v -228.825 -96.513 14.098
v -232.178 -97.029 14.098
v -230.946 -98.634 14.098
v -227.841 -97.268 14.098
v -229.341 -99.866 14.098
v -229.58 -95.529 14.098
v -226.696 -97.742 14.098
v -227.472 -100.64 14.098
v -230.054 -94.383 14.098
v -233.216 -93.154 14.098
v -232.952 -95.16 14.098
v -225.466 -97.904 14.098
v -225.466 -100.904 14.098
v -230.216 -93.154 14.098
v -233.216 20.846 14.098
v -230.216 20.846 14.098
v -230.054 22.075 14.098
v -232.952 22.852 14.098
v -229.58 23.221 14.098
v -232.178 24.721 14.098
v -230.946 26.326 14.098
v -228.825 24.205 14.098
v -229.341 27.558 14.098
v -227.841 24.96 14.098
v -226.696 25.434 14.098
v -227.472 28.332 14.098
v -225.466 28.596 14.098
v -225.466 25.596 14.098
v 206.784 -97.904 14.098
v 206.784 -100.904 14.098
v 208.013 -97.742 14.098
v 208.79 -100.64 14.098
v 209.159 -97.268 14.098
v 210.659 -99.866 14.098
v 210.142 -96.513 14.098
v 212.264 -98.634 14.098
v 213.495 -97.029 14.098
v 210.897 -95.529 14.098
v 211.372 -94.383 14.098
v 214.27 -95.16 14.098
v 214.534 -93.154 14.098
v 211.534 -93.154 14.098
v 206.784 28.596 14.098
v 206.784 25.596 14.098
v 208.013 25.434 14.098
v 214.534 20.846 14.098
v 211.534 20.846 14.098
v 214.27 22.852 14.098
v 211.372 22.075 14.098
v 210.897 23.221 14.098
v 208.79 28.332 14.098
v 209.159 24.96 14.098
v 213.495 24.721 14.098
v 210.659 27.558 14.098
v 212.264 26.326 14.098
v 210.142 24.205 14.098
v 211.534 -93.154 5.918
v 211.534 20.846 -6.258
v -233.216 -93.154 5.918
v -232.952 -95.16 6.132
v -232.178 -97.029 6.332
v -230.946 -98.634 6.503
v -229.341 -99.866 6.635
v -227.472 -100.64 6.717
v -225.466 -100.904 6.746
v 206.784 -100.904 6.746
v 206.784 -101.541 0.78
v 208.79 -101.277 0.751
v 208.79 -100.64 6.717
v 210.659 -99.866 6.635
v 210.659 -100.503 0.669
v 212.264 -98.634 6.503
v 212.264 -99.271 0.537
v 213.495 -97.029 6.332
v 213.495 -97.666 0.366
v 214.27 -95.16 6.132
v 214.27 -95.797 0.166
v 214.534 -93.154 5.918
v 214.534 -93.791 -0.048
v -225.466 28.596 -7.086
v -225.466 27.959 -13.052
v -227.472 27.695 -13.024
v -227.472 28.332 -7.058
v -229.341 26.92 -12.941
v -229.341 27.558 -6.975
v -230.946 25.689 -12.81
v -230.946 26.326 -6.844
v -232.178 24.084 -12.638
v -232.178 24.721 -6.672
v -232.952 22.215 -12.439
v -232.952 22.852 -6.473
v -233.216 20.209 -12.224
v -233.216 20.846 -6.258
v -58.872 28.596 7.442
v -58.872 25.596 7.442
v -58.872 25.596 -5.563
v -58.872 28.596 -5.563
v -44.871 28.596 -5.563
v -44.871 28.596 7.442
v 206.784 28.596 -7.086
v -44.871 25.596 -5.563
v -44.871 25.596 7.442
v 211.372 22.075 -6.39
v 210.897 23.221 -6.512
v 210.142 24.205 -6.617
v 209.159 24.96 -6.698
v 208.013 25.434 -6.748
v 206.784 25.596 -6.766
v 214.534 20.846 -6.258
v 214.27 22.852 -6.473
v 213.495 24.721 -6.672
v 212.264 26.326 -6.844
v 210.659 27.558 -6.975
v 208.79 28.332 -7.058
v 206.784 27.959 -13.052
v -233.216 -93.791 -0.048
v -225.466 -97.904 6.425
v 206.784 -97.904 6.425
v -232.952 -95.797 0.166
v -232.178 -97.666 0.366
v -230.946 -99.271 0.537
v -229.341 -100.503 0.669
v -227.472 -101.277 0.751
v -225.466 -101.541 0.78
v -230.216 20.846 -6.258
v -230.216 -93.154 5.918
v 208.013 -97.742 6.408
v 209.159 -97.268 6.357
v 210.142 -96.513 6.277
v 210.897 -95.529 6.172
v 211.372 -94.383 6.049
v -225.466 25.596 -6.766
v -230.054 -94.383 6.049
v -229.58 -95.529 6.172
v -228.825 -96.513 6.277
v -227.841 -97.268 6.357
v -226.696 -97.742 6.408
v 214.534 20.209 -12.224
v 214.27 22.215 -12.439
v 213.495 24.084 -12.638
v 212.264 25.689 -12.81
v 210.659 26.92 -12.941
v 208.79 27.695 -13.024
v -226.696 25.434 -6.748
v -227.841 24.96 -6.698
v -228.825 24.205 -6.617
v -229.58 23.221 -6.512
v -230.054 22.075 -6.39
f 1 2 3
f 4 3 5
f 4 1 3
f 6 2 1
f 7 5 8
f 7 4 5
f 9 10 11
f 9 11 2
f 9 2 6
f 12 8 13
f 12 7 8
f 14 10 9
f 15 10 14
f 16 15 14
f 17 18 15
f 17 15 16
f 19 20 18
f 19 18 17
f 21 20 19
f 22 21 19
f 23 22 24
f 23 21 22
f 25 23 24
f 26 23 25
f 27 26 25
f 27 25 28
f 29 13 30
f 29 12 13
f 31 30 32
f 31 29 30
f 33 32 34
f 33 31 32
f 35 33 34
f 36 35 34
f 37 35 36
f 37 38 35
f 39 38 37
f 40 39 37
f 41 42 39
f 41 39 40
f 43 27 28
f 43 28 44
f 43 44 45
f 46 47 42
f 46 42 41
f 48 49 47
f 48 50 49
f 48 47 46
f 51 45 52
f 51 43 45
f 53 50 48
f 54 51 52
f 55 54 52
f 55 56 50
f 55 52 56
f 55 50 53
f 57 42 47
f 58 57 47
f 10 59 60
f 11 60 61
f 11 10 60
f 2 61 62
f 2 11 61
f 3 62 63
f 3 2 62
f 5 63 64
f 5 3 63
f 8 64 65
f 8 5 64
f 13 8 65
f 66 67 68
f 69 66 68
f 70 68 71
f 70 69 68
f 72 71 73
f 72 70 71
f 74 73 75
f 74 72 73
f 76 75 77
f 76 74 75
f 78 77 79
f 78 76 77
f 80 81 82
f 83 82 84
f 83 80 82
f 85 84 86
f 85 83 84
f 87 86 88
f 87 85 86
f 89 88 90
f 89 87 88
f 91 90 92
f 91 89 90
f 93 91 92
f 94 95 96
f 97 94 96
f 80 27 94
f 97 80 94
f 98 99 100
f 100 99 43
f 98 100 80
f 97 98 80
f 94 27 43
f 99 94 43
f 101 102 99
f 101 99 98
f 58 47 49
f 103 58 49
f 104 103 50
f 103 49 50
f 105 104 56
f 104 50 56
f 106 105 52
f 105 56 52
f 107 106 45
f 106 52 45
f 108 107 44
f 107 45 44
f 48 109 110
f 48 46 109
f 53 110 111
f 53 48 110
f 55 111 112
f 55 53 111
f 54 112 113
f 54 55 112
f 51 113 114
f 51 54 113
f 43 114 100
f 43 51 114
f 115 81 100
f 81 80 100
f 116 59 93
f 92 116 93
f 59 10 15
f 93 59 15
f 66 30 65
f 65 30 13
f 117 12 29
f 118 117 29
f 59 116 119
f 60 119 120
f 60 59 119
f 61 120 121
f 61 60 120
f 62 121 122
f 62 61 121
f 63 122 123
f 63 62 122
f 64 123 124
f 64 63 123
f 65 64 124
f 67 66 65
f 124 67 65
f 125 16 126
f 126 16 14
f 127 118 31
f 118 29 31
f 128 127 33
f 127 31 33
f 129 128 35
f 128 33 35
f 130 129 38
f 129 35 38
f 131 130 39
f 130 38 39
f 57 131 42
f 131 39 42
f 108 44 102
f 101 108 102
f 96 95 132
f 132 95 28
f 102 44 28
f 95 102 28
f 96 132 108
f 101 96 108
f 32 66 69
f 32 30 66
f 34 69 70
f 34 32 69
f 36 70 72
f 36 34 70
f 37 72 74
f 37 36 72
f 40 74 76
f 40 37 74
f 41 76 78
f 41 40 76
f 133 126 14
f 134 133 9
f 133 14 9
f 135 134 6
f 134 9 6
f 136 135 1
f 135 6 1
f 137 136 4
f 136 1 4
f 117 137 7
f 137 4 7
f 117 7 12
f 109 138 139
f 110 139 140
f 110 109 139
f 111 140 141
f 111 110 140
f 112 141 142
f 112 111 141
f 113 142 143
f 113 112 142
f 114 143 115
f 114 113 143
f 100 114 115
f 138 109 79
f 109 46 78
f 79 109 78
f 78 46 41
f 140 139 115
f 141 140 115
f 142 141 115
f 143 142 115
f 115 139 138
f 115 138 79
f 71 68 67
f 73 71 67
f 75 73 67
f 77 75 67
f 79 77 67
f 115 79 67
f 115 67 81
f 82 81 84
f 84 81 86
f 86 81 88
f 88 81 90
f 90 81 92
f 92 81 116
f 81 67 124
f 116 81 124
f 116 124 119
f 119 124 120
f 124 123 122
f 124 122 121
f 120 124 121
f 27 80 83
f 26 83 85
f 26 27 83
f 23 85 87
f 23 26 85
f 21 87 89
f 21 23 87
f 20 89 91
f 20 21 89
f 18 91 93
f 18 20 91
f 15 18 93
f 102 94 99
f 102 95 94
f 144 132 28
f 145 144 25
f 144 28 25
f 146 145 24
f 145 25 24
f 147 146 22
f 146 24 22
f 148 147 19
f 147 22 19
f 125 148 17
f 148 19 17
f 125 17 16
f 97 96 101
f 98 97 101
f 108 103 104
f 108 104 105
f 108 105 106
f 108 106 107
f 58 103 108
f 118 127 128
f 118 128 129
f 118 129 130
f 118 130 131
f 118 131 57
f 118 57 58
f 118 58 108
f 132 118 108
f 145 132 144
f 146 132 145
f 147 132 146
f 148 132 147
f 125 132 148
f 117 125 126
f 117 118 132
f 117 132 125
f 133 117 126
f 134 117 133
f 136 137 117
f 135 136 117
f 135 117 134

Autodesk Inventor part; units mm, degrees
ref_plane "YZ Plane" through (0, 0, 0) normal (1, 0, 0) x (0, 1, 0)
ref_plane "XZ Plane" through (0, 0, 0) normal (0, 1, 0) x (-1, 0, 0)
ref_plane "XY Plane" through (0, 0, 0) normal (0, 0, 1) x (1, 0, 0)
sketch "Sketch1" plane through (0, 0, 0) normal (1, 0, 0) x (0, 1, 0)
  line L0 (-93.1541, 14.0981) -> (20.8459, 14.0981) projected
  line L1 (-93.1541, 14.0981) -> (-93.1541, 12.5981) projected
  line L2 (20.8459, 12.5981) -> (-93.1541, 12.5981) projected
  line L3 (20.8459, 14.0981) -> (20.8459, 12.5981) projected
  line L4 (-93.1541, 7.4943) -> (-93.1541, 9.0943) projected
  line L5 (-93.1541, 7.4943) -> (20.8459, 7.4943) projected
  line L6 (20.8459, 7.4943) -> (20.8459, 9.0943) projected
  line L7 (-93.1541, 9.0943) -> (20.8459, 9.0943) projected
  line L8 (25.5959, 14.0981) -> (20.8459, 14.0981) projected
  line L9 (20.8459, 12.5981) -> (25.5959, 12.5981) projected
  line L10 (25.5959, 14.0981) -> (25.5959, 12.5981) projected
  line L11 (25.5959, 9.0943) -> (20.8459, 9.0943) projected
  line L12 (25.5959, 7.4943) -> (20.8459, 7.4943) projected
  line L13 (25.5959, 7.4943) -> (25.5959, 9.0943) projected
  line L14 (-93.1541, 9.0943) -> (-97.9041, 9.0943) projected
  line L15 (-93.1541, 7.4943) -> (-97.9041, 7.4943) projected
  line L16 (-97.9041, 7.4943) -> (-97.9041, 9.0943) projected
  line L17 (-93.1541, 14.0981) -> (-97.9041, 14.0981) projected
  line L18 (-97.9041, 12.5981) -> (-93.1541, 12.5981) projected
  line L19 (-97.9041, 14.0981) -> (-97.9041, 12.5981) projected
  line L20 (-93.4041, 11.6343) -> (-93.3041, 11.6343) projected
  point P0 (0, 0)
ref_plane "Work Plane1" through (-45.4451, 14.3376, -5.5632) normal (0, 0.1062, 0.9943) x (-1, 0, 0)
ref_plane "Work Plane2" through (-9.3413, -36.1541, 14.0981) normal (0, 0, 1) x (1, 0, 0)
sketch "Sketch3" plane through (-9.3413, -36.1541, 14.0981) normal (0, 0, 1) x (1, 0, 0)
  line L0 (-211.6644, 41.535) -> (-205.2313, 59.21) projected
  line L1 (-205.2313, 59.21) -> (-202.7313, 59.21) projected
  line L2 (-202.7313, 59.21) -> (-209.1644, 41.535) projected
  line L3 (-209.1644, 41.535) -> (-211.6644, 41.535) projected
  line L4 (-201.6644, 41.535) -> (-195.2313, 59.21) projected
  line L5 (-195.2313, 59.21) -> (-192.7313, 59.21) projected
  line L6 (-192.7313, 59.21) -> (-199.1644, 41.535) projected
  line L7 (-199.1644, 41.535) -> (-201.6644, 41.535) projected
  line L8 (-191.6644, 41.535) -> (-185.2313, 59.21) projected
  line L9 (-185.2313, 59.21) -> (-182.7313, 59.21) projected
  line L10 (-182.7313, 59.21) -> (-189.1644, 41.535) projected
  line L11 (-189.1644, 41.535) -> (-191.6644, 41.535) projected
  line L12 (-181.6644, 41.535) -> (-175.2313, 59.21) projected
  line L13 (-175.2313, 59.21) -> (-172.7313, 59.21) projected
  line L14 (-172.7313, 59.21) -> (-179.1644, 41.535) projected
  line L15 (-179.1644, 41.535) -> (-181.6644, 41.535) projected
  line L16 (-171.6644, 41.535) -> (-165.2313, 59.21) projected
  line L17 (-165.2313, 59.21) -> (-162.7313, 59.21) projected
  line L18 (-162.7313, 59.21) -> (-169.1644, 41.535) projected
  line L19 (-169.1644, 41.535) -> (-171.6644, 41.535) projected
  line L20 (-161.6644, 41.535) -> (-155.2313, 59.21) projected
  line L21 (-155.2313, 59.21) -> (-152.7313, 59.21) projected
  line L22 (-152.7313, 59.21) -> (-159.1644, 41.535) projected
  line L23 (-159.1644, 41.535) -> (-161.6644, 41.535) projected
  line L24 (-151.6644, 41.535) -> (-145.2313, 59.21) projected
  line L25 (-145.2313, 59.21) -> (-142.7313, 59.21) projected
  line L26 (-142.7313, 59.21) -> (-149.1644, 41.535) projected
  line L27 (-149.1644, 41.535) -> (-151.6644, 41.535) projected
  line L28 (-141.6644, 41.535) -> (-135.2313, 59.21) projected
  line L29 (-135.2313, 59.21) -> (-132.7313, 59.21) projected
  line L30 (-132.7313, 59.21) -> (-139.1644, 41.535) projected
  line L31 (-139.1644, 41.535) -> (-141.6644, 41.535) projected
  line L32 (-134.1647, 41.535) -> (-136.6647, 41.535) projected
  line L33 (-136.6647, 41.535) -> (-131.39, 56.027) projected
  line L34 (-131.39, 56.027) -> (-131.39, 49.1583) projected
  line L35 (-131.39, 49.1583) -> (-134.1647, 41.535) projected
  line L36 (-141.27, 35.75) -> (-143.77, 35.75) projected
  line L37 (-143.77, 35.75) -> (-142.3378, 39.685) projected
  line L38 (-142.3378, 39.685) -> (-139.8378, 39.685) projected
  line L39 (-139.8378, 39.685) -> (-141.27, 35.75) projected
  line L40 (-151.27, 35.75) -> (-153.77, 35.75) projected
  line L41 (-153.77, 35.75) -> (-152.3378, 39.685) projected
  line L42 (-152.3378, 39.685) -> (-149.8378, 39.685) projected
  line L43 (-149.8378, 39.685) -> (-151.27, 35.75) projected
  line L44 (-161.27, 35.75) -> (-163.77, 35.75) projected
  line L45 (-163.77, 35.75) -> (-162.3378, 39.685) projected
  line L46 (-162.3378, 39.685) -> (-159.8378, 39.685) projected
  line L47 (-159.8378, 39.685) -> (-161.27, 35.75) projected
  line L48 (-171.27, 35.75) -> (-173.77, 35.75) projected
  line L49 (-173.77, 35.75) -> (-172.3378, 39.685) projected
  line L50 (-172.3378, 39.685) -> (-169.8378, 39.685) projected
  line L51 (-169.8378, 39.685) -> (-171.27, 35.75) projected
  line L52 (-181.27, 35.75) -> (-183.77, 35.75) projected
  line L53 (-183.77, 35.75) -> (-182.3378, 39.685) projected
  line L54 (-182.3378, 39.685) -> (-179.8378, 39.685) projected
  line L55 (-179.8378, 39.685) -> (-181.27, 35.75) projected
  line L56 (-191.27, 35.75) -> (-193.77, 35.75) projected
  line L57 (-193.77, 35.75) -> (-192.3378, 39.685) projected
  line L58 (-192.3378, 39.685) -> (-189.8378, 39.685) projected
  line L59 (-189.8378, 39.685) -> (-191.27, 35.75) projected
  line L60 (-201.27, 35.75) -> (-203.77, 35.75) projected
  line L61 (-203.77, 35.75) -> (-202.3378, 39.685) projected
  line L62 (-202.3378, 39.685) -> (-199.8378, 39.685) projected
  line L63 (-199.8378, 39.685) -> (-201.27, 35.75) projected
  line L64 (-211.27, 35.75) -> (-213.77, 35.75) projected
  line L65 (-213.77, 35.75) -> (-212.3378, 39.685) projected
  line L66 (-212.3378, 39.685) -> (-209.8378, 39.685) projected
  line L67 (-209.8378, 39.685) -> (-211.27, 35.75) projected
  line L68 (-206.27, 35.75) -> (-208.77, 35.75) projected
  line L69 (-208.77, 35.75) -> (-207.3378, 39.685) projected
  line L70 (-207.3378, 39.685) -> (-204.8378, 39.685) projected
  line L71 (-204.8378, 39.685) -> (-206.27, 35.75) projected
  line L72 (-196.27, 35.75) -> (-198.77, 35.75) projected
  line L73 (-198.77, 35.75) -> (-197.3378, 39.685) projected
  line L74 (-197.3378, 39.685) -> (-194.8378, 39.685) projected
  line L75 (-194.8378, 39.685) -> (-196.27, 35.75) projected
  line L76 (-186.27, 35.75) -> (-188.77, 35.75) projected
  line L77 (-188.77, 35.75) -> (-187.3378, 39.685) projected
  line L78 (-187.3378, 39.685) -> (-184.8378, 39.685) projected
  line L79 (-184.8378, 39.685) -> (-186.27, 35.75) projected
  line L80 (-176.27, 35.75) -> (-178.77, 35.75) projected
  line L81 (-178.77, 35.75) -> (-177.3378, 39.685) projected
  line L82 (-177.3378, 39.685) -> (-174.8378, 39.685) projected
  line L83 (-174.8378, 39.685) -> (-176.27, 35.75) projected
  line L84 (-166.27, 35.75) -> (-168.77, 35.75) projected
  line L85 (-168.77, 35.75) -> (-167.3378, 39.685) projected
  line L86 (-167.3378, 39.685) -> (-164.8378, 39.685) projected
  line L87 (-164.8378, 39.685) -> (-166.27, 35.75) projected
  line L88 (-156.27, 35.75) -> (-158.77, 35.75) projected
  line L89 (-158.77, 35.75) -> (-157.3378, 39.685) projected
  line L90 (-157.3378, 39.685) -> (-154.8378, 39.685) projected
  line L91 (-154.8378, 39.685) -> (-156.27, 35.75) projected
  line L92 (-146.27, 35.75) -> (-148.77, 35.75) projected
  line L93 (-148.77, 35.75) -> (-147.3378, 39.685) projected
  line L94 (-147.3378, 39.685) -> (-144.8378, 39.685) projected
  line L95 (-144.8378, 39.685) -> (-146.27, 35.75) projected
  line L96 (-136.2702, 35.75) -> (-138.7702, 35.75) projected
  line L97 (-138.7702, 35.75) -> (-137.338, 39.685) projected
  line L98 (-137.338, 39.685) -> (-134.838, 39.685) projected
  line L99 (-134.838, 39.685) -> (-136.2702, 35.75) projected
  line L100 (-213.77, 49.4867) -> (-210.231, 59.21) projected
  line L101 (-210.231, 59.21) -> (-207.731, 59.21) projected
  line L102 (-207.731, 59.21) -> (-213.77, 42.618) projected
  line L103 (-213.77, 42.618) -> (-213.77, 49.4867) projected
  line L104 (-146.6644, 41.535) -> (-140.2313, 59.21) projected
  line L105 (-140.2313, 59.21) -> (-137.7313, 59.21) projected
  line L106 (-137.7313, 59.21) -> (-144.1644, 41.535) projected
  line L107 (-144.1644, 41.535) -> (-146.6644, 41.535) projected
  line L108 (-156.6644, 41.535) -> (-150.2313, 59.21) projected
  line L109 (-150.2313, 59.21) -> (-147.7313, 59.21) projected
  line L110 (-147.7313, 59.21) -> (-154.1644, 41.535) projected
  line L111 (-154.1644, 41.535) -> (-156.6644, 41.535) projected
  line L112 (-166.6644, 41.535) -> (-160.2313, 59.21) projected
  line L113 (-160.2313, 59.21) -> (-157.7313, 59.21) projected
  line L114 (-157.7313, 59.21) -> (-164.1644, 41.535) projected
  line L115 (-164.1644, 41.535) -> (-166.6644, 41.535) projected
  line L116 (-176.6644, 41.535) -> (-170.2313, 59.21) projected
  line L117 (-170.2313, 59.21) -> (-167.7313, 59.21) projected
  line L118 (-167.7313, 59.21) -> (-174.1644, 41.535) projected
  line L119 (-174.1644, 41.535) -> (-176.6644, 41.535) projected
  line L120 (-186.6644, 41.535) -> (-180.2313, 59.21) projected
  line L121 (-180.2313, 59.21) -> (-177.7313, 59.21) projected
  line L122 (-177.7313, 59.21) -> (-184.1644, 41.535) projected
  line L123 (-184.1644, 41.535) -> (-186.6644, 41.535) projected
  line L124 (-196.6644, 41.535) -> (-190.2313, 59.21) projected
  line L125 (-190.2313, 59.21) -> (-187.7313, 59.21) projected
  line L126 (-187.7313, 59.21) -> (-194.1644, 41.535) projected
  line L127 (-194.1644, 41.535) -> (-196.6644, 41.535) projected
  line L128 (-206.6644, 41.535) -> (-200.2313, 59.21) projected
  line L129 (-200.2313, 59.21) -> (-197.7313, 59.21) projected
  line L130 (-197.7313, 59.21) -> (-204.1644, 41.535) projected
  line L131 (-204.1644, 41.535) -> (-206.6644, 41.535) projected
  line L132 (-78.7722, 35.75) -> (-133.77, 35.75) projected
  line L133 (-133.77, 35.75) -> (-132.3378, 39.685) projected
  line L134 (-132.3378, 39.685) -> (-77.34, 39.685) projected
  line L135 (-77.34, 39.685) -> (-78.7722, 35.75) projected
  line L136 (-77.34, 41.535) -> (-129.54, 41.535) projected
  line L137 (-129.54, 41.535) -> (-129.54, 59.315) projected
  line L138 (-129.54, 59.315) -> (-77.34, 59.315) projected
  line L139 (-77.34, 59.315) -> (-77.34, 41.535) projected
  line L140 (159, -26.25) -> (159, -40.25) projected
  line L141 (159, -40.25) -> (145, -40.25) projected
  line L142 (145, -40.25) -> (145, -26.25) projected
  line L143 (145, -26.25) -> (159, -26.25) projected
  line L144 (140, -26.25) -> (140, -40.25) projected
  line L145 (140, -40.25) -> (126, -40.25) projected
  line L146 (126, -40.25) -> (126, -26.25) projected
  line L147 (126, -26.25) -> (140, -26.25) projected
  line L148 (121, -26.25) -> (121, -40.25) projected
  line L149 (121, -40.25) -> (107, -40.25) projected
  line L150 (107, -40.25) -> (107, -26.25) projected
  line L151 (107, -26.25) -> (121, -26.25) projected
  line L152 (102, -26.25) -> (102, -40.25) projected
  line L153 (102, -40.25) -> (88, -40.25) projected
  line L154 (88, -40.25) -> (88, -26.25) projected
  line L155 (88, -26.25) -> (102, -26.25) projected
  line L156 (83, -26.25) -> (83, -40.25) projected
  line L157 (83, -40.25) -> (69, -40.25) projected
  line L158 (69, -40.25) -> (69, -26.25) projected
  line L159 (69, -26.25) -> (83, -26.25) projected
  line L160 (64, -26.25) -> (64, -40.25) projected
  line L161 (64, -40.25) -> (50, -40.25) projected
  line L162 (50, -40.25) -> (50, -26.25) projected
  line L163 (50, -26.25) -> (64, -26.25) projected
  line L164 (45, -26.25) -> (45, -40.25) projected
  line L165 (45, -40.25) -> (31, -40.25) projected
  line L166 (31, -40.25) -> (31, -26.25) projected
  line L167 (31, -26.25) -> (45, -26.25) projected
  line L168 (26, -26.25) -> (26, -40.25) projected
  line L169 (26, -40.25) -> (12, -40.25) projected
  line L170 (12, -40.25) -> (12, -26.25) projected
  line L171 (12, -26.25) -> (26, -26.25) projected
  line L172 (7, -26.25) -> (7, -40.25) projected
  line L173 (7, -40.25) -> (-7, -40.25) projected
  line L174 (-7, -40.25) -> (-7, -26.25) projected
  line L175 (-7, -26.25) -> (7, -26.25) projected
  line L176 (154.5, -7.25) -> (168.5, -7.25) projected
  line L177 (168.5, -7.25) -> (168.5, -21.25) projected
  line L178 (168.5, -21.25) -> (154.5, -21.25) projected
  line L179 (154.5, -21.25) -> (154.5, -7.25) projected
  line L180 (135.5, -7.25) -> (149.5, -7.25) projected
  line L181 (149.5, -7.25) -> (149.5, -21.25) projected
  line L182 (149.5, -21.25) -> (135.5, -21.25) projected
  line L183 (135.5, -21.25) -> (135.5, -7.25) projected
  line L184 (116.5, -7.25) -> (130.5, -7.25) projected
  line L185 (130.5, -7.25) -> (130.5, -21.25) projected
  line L186 (130.5, -21.25) -> (116.5, -21.25) projected
  line L187 (116.5, -21.25) -> (116.5, -7.25) projected
  line L188 (97.5, -7.25) -> (111.5, -7.25) projected
  line L189 (111.5, -7.25) -> (111.5, -21.25) projected
  line L190 (111.5, -21.25) -> (97.5, -21.25) projected
  line L191 (97.5, -21.25) -> (97.5, -7.25) projected
  line L192 (78.5, -7.25) -> (92.5, -7.25) projected
  line L193 (92.5, -7.25) -> (92.5, -21.25) projected
  line L194 (92.5, -21.25) -> (78.5, -21.25) projected
  line L195 (78.5, -21.25) -> (78.5, -7.25) projected
  line L196 (59.5, -7.25) -> (73.5, -7.25) projected
  line L197 (73.5, -7.25) -> (73.5, -21.25) projected
  line L198 (73.5, -21.25) -> (59.5, -21.25) projected
  line L199 (59.5, -21.25) -> (59.5, -7.25) projected
  line L200 (40.5, -7.25) -> (54.5, -7.25) projected
  line L201 (54.5, -7.25) -> (54.5, -21.25) projected
  line L202 (54.5, -21.25) -> (40.5, -21.25) projected
  line L203 (40.5, -21.25) -> (40.5, -7.25) projected
  line L204 (21.5, -7.25) -> (35.5, -7.25) projected
  line L205 (35.5, -7.25) -> (35.5, -21.25) projected
  line L206 (35.5, -21.25) -> (21.5, -21.25) projected
  line L207 (21.5, -21.25) -> (21.5, -7.25) projected
  line L208 (2.5, -7.25) -> (16.5, -7.25) projected
  line L209 (16.5, -7.25) -> (16.5, -21.25) projected
  line L210 (16.5, -21.25) -> (2.5, -21.25) projected
  line L211 (2.5, -21.25) -> (2.5, -7.25) projected
  line L212 (-16.5, -7.25) -> (-2.5, -7.25) projected
  line L213 (-2.5, -7.25) -> (-2.5, -21.25) projected
  line L214 (-2.5, -21.25) -> (-16.5, -21.25) projected
  line L215 (-16.5, -21.25) -> (-16.5, -7.25) projected
  line L216 (182.75, 11.75) -> (182.75, -2.25) projected
  line L217 (182.75, -2.25) -> (168.75, -2.25) projected
  line L218 (168.75, -2.25) -> (168.75, 11.75) projected
  line L219 (168.75, 11.75) -> (182.75, 11.75) projected
  line L220 (163.75, 11.75) -> (163.75, -2.25) projected
  line L221 (163.75, -2.25) -> (149.75, -2.25) projected
  line L222 (149.75, -2.25) -> (149.75, 11.75) projected
  line L223 (149.75, 11.75) -> (163.75, 11.75) projected
  line L224 (144.75, 11.75) -> (144.75, -2.25) projected
  line L225 (144.75, -2.25) -> (130.75, -2.25) projected
  line L226 (130.75, -2.25) -> (130.75, 11.75) projected
  line L227 (130.75, 11.75) -> (144.75, 11.75) projected
  line L228 (125.75, 11.75) -> (125.75, -2.25) projected
  line L229 (125.75, -2.25) -> (111.75, -2.25) projected
  line L230 (111.75, -2.25) -> (111.75, 11.75) projected
  line L231 (111.75, 11.75) -> (125.75, 11.75) projected
  line L232 (106.75, 11.75) -> (106.75, -2.25) projected
  line L233 (106.75, -2.25) -> (92.75, -2.25) projected
  line L234 (92.75, -2.25) -> (92.75, 11.75) projected
  line L235 (92.75, 11.75) -> (106.75, 11.75) projected
  line L236 (87.75, 11.75) -> (87.75, -2.25) projected
  line L237 (87.75, -2.25) -> (73.75, -2.25) projected
  line L238 (73.75, -2.25) -> (73.75, 11.75) projected
  line L239 (73.75, 11.75) -> (87.75, 11.75) projected
  line L240 (68.75, 11.75) -> (68.75, -2.25) projected
  line L241 (68.75, -2.25) -> (54.75, -2.25) projected
  line L242 (54.75, -2.25) -> (54.75, 11.75) projected
  line L243 (54.75, 11.75) -> (68.75, 11.75) projected
  line L244 (49.75, 11.75) -> (49.75, -2.25) projected
  line L245 (49.75, -2.25) -> (35.75, -2.25) projected
  line L246 (35.75, -2.25) -> (35.75, 11.75) projected
  line L247 (35.75, 11.75) -> (49.75, 11.75) projected
  line L248 (30.75, 11.75) -> (30.75, -2.25) projected
  line L249 (30.75, -2.25) -> (16.75, -2.25) projected
  line L250 (16.75, -2.25) -> (16.75, 11.75) projected
  line L251 (16.75, 11.75) -> (30.75, 11.75) projected
  line L252 (11.75, 11.75) -> (11.75, -2.25) projected
  line L253 (11.75, -2.25) -> (-2.25, -2.25) projected
  line L254 (-2.25, -2.25) -> (-2.25, 11.75) projected
  line L255 (-2.25, 11.75) -> (11.75, 11.75) projected
  line L256 (-7.25, 11.75) -> (-7.25, -2.25) projected
  line L257 (-7.25, -2.25) -> (-21.25, -2.25) projected
  line L258 (-21.25, -2.25) -> (-21.25, 11.75) projected
  line L259 (-21.25, 11.75) -> (-7.25, 11.75) projected
  line L260 (-12, -26.25) -> (-12, -40.25) projected
  line L261 (-12, -40.25) -> (-26, -40.25) projected
  line L262 (-26, -40.25) -> (-26, -26.25) projected
  line L263 (-26, -26.25) -> (-12, -26.25) projected
  line L264 (-21.5, -7.25) -> (-21.5, -21.25) projected
  line L265 (-21.5, -21.25) -> (-35.5, -21.25) projected
  line L266 (-35.5, -21.25) -> (-35.5, -7.25) projected
  line L267 (-35.5, -7.25) -> (-21.5, -7.25) projected
  line L268 (-26.25, 11.75) -> (-26.25, -2.25) projected
  line L269 (-26.25, -2.25) -> (-40.25, -2.25) projected
  line L270 (-40.25, -2.25) -> (-40.25, 11.75) projected
  line L271 (-40.25, 11.75) -> (-26.25, 11.75) projected
  line L272 (201.75, 30.75) -> (201.75, 16.75) projected
  line L273 (201.75, 16.75) -> (187.75, 16.75) projected
  line L274 (187.75, 16.75) -> (187.75, 30.75) projected
  line L275 (187.75, 30.75) -> (201.75, 30.75) projected
  line L276 (206.5, 11.75) -> (206.5, -2.25) projected
  line L277 (206.5, -2.25) -> (192.5, -2.25) projected
  line L278 (192.5, -2.25) -> (192.5, 11.75) projected
  line L279 (192.5, 11.75) -> (206.5, 11.75) projected
  line L280 (199.375, -7.25) -> (199.375, -21.25) projected
  line L281 (199.375, -21.25) -> (185.375, -21.25) projected
  line L282 (185.375, -21.25) -> (185.375, -7.25) projected
  line L283 (185.375, -7.25) -> (199.375, -7.25) projected
  line L284 (194.625, -26.25) -> (194.625, -40.25) projected
  line L285 (194.625, -40.25) -> (180.625, -40.25) projected
  line L286 (180.625, -40.25) -> (180.625, -26.25) projected
  line L287 (180.625, -26.25) -> (194.625, -26.25) projected
  line L288 (208.875, -45.25) -> (208.875, -59.25) projected
  line L289 (208.875, -59.25) -> (194.875, -59.25) projected
  line L290 (194.875, -59.25) -> (194.875, -45.25) projected
  line L291 (194.875, -45.25) -> (208.875, -45.25) projected
  line L292 (185.125, -45.25) -> (185.125, -59.25) projected
  line L293 (185.125, -59.25) -> (171.125, -59.25) projected
  line L294 (171.125, -59.25) -> (171.125, -45.25) projected
  line L295 (171.125, -45.25) -> (185.125, -45.25) projected
  line L296 (161.375, -45.25) -> (161.375, -59.25) projected
  line L297 (161.375, -59.25) -> (147.375, -59.25) projected
  line L298 (147.375, -59.25) -> (147.375, -45.25) projected
  line L299 (147.375, -45.25) -> (161.375, -45.25) projected
  line L300 (78.25, -45.25) -> (78.25, -59.25) projected
  line L301 (78.25, -59.25) -> (64.25, -59.25) projected
  line L302 (64.25, -59.25) -> (64.25, -45.25) projected
  line L303 (64.25, -45.25) -> (78.25, -45.25) projected
  line L304 (-4.875, -45.25) -> (-4.875, -59.25) projected
  line L305 (-4.875, -59.25) -> (-18.875, -59.25) projected
  line L306 (-18.875, -59.25) -> (-18.875, -45.25) projected
  line L307 (-18.875, -45.25) -> (-4.875, -45.25) projected
  line L308 (-28.625, -45.25) -> (-28.625, -59.25) projected
  line L309 (-28.625, -59.25) -> (-42.625, -59.25) projected
  line L310 (-42.625, -59.25) -> (-42.625, -45.25) projected
  line L311 (-42.625, -45.25) -> (-28.625, -45.25) projected
  line L312 (-52.375, -45.25) -> (-52.375, -59.25) projected
  line L313 (-52.375, -59.25) -> (-66.375, -59.25) projected
  line L314 (-66.375, -59.25) -> (-66.375, -45.25) projected
  line L315 (-66.375, -45.25) -> (-52.375, -45.25) projected
  line L316 (-42.875, -26.25) -> (-42.875, -40.25) projected
  line L317 (-42.875, -40.25) -> (-56.875, -40.25) projected
  line L318 (-56.875, -40.25) -> (-56.875, -26.25) projected
  line L319 (-56.875, -26.25) -> (-42.875, -26.25) projected
  line L320 (-47.625, -7.25) -> (-47.625, -21.25) projected
  line L321 (-47.625, -21.25) -> (-61.625, -21.25) projected
  line L322 (-61.625, -21.25) -> (-61.625, -7.25) projected
  line L323 (-61.625, -7.25) -> (-47.625, -7.25) projected
  line L324 (-50, 11.75) -> (-50, -2.25) projected
  line L325 (-50, -2.25) -> (-64, -2.25) projected
  line L326 (-64, -2.25) -> (-64, 11.75) projected
  line L327 (-64, 11.75) -> (-50, 11.75) projected
  line L328 (173.25, 30.75) -> (173.25, 16.75) projected
  line L329 (173.25, 16.75) -> (159.25, 16.75) projected
  line L330 (159.25, 16.75) -> (159.25, 30.75) projected
  line L331 (159.25, 30.75) -> (173.25, 30.75) projected
  line L332 (154.25, 30.75) -> (154.25, 16.75) projected
  line L333 (154.25, 16.75) -> (140.25, 16.75) projected
  line L334 (140.25, 16.75) -> (140.25, 30.75) projected
  line L335 (140.25, 30.75) -> (154.25, 30.75) projected
  line L336 (135.25, 30.75) -> (135.25, 16.75) projected
  line L337 (135.25, 16.75) -> (121.25, 16.75) projected
  line L338 (121.25, 16.75) -> (121.25, 30.75) projected
  line L339 (121.25, 30.75) -> (135.25, 30.75) projected
  line L340 (116.25, 30.75) -> (116.25, 16.75) projected
  line L341 (116.25, 16.75) -> (102.25, 16.75) projected
  line L342 (102.25, 16.75) -> (102.25, 30.75) projected
  line L343 (102.25, 30.75) -> (116.25, 30.75) projected
  line L344 (97.25, 30.75) -> (97.25, 16.75) projected
  line L345 (97.25, 16.75) -> (83.25, 16.75) projected
  line L346 (83.25, 16.75) -> (83.25, 30.75) projected
  line L347 (83.25, 30.75) -> (97.25, 30.75) projected
  line L348 (78.25, 30.75) -> (78.25, 16.75) projected
  line L349 (78.25, 16.75) -> (64.25, 16.75) projected
  line L350 (64.25, 16.75) -> (64.25, 30.75) projected
  line L351 (64.25, 30.75) -> (78.25, 30.75) projected
  line L352 (59.25, 30.75) -> (59.25, 16.75) projected
  line L353 (59.25, 16.75) -> (45.25, 16.75) projected
  line L354 (45.25, 16.75) -> (45.25, 30.75) projected
  line L355 (45.25, 30.75) -> (59.25, 30.75) projected
  line L356 (40.25, 30.75) -> (40.25, 16.75) projected
  line L357 (40.25, 16.75) -> (26.25, 16.75) projected
  line L358 (26.25, 16.75) -> (26.25, 30.75) projected
  line L359 (26.25, 30.75) -> (40.25, 30.75) projected
  line L360 (21.25, 30.75) -> (21.25, 16.75) projected
  line L361 (21.25, 16.75) -> (7.25, 16.75) projected
  line L362 (7.25, 16.75) -> (7.25, 30.75) projected
  line L363 (7.25, 30.75) -> (21.25, 30.75) projected
  line L364 (2.25, 30.75) -> (2.25, 16.75) projected
  line L365 (2.25, 16.75) -> (-11.75, 16.75) projected
  line L366 (-11.75, 16.75) -> (-11.75, 30.75) projected
  line L367 (-11.75, 30.75) -> (2.25, 30.75) projected
  line L368 (-16.75, 30.75) -> (-16.75, 16.75) projected
  line L369 (-16.75, 16.75) -> (-30.75, 16.75) projected
  line L370 (-30.75, 16.75) -> (-30.75, 30.75) projected
  line L371 (-30.75, 30.75) -> (-16.75, 30.75) projected
  line L372 (-35.75, 30.75) -> (-35.75, 16.75) projected
  line L373 (-35.75, 16.75) -> (-49.75, 16.75) projected
  line L374 (-49.75, 16.75) -> (-49.75, 30.75) projected
  line L375 (-49.75, 30.75) -> (-35.75, 30.75) projected
  line L376 (-54.75, 30.75) -> (-54.75, 16.75) projected
  line L377 (-54.75, 16.75) -> (-68.75, 16.75) projected
  line L378 (-68.75, 16.75) -> (-68.75, 30.75) projected
  line L379 (-68.75, 30.75) -> (-54.75, 30.75) projected
  line L380 (-92.5, -2.25) -> (-92.5, 11.75) projected
  line L381 (-92.5, 11.75) -> (-78.5, 11.75) projected
  line L382 (-78.5, 11.75) -> (-78.5, -2.25) projected
  line L383 (-78.5, -2.25) -> (-92.5, -2.25) projected
  line L384 (-111.5, -2.25) -> (-111.5, 11.75) projected
  line L385 (-111.5, 11.75) -> (-97.5, 11.75) projected
  line L386 (-97.5, 11.75) -> (-97.5, -2.25) projected
  line L387 (-97.5, -2.25) -> (-111.5, -2.25) projected
  line L388 (-130.5, -2.25) -> (-130.5, 11.75) projected
  line L389 (-130.5, 11.75) -> (-116.5, 11.75) projected
  line L390 (-116.5, 11.75) -> (-116.5, -2.25) projected
  line L391 (-116.5, -2.25) -> (-130.5, -2.25) projected
  line L392 (-92.5, 16.75) -> (-92.5, 30.75) projected
  line L393 (-92.5, 30.75) -> (-78.5, 30.75) projected
  line L394 (-78.5, 30.75) -> (-78.5, 16.75) projected
  line L395 (-78.5, 16.75) -> (-92.5, 16.75) projected
  line L396 (-111.5, 16.75) -> (-111.5, 30.75) projected
  line L397 (-111.5, 30.75) -> (-97.5, 30.75) projected
  line L398 (-97.5, 30.75) -> (-97.5, 16.75) projected
  line L399 (-97.5, 16.75) -> (-111.5, 16.75) projected
  line L400 (-116.5, 30.75) -> (-116.5, 16.75) projected
  line L401 (-116.5, 16.75) -> (-130.5, 16.75) projected
  line L402 (-130.5, 16.75) -> (-130.5, 30.75) projected
  line L403 (-130.5, 30.75) -> (-116.5, 30.75) projected
  line L404 (-97.5, -26.25) -> (-97.5, -40.25) projected
  line L405 (-97.5, -40.25) -> (-111.5, -40.25) projected
  line L406 (-111.5, -40.25) -> (-111.5, -26.25) projected
  line L407 (-111.5, -26.25) -> (-97.5, -26.25) projected
  line L408 (-78.5, -45.25) -> (-78.5, -59.25) projected
  line L409 (-78.5, -59.25) -> (-92.5, -59.25) projected
  line L410 (-92.5, -59.25) -> (-92.5, -45.25) projected
  line L411 (-92.5, -45.25) -> (-78.5, -45.25) projected
  line L412 (-97.5, -45.25) -> (-97.5, -59.25) projected
  line L413 (-97.5, -59.25) -> (-111.5, -59.25) projected
  line L414 (-111.5, -59.25) -> (-111.5, -45.25) projected
  line L415 (-111.5, -45.25) -> (-97.5, -45.25) projected
  line L416 (-116.5, -45.25) -> (-116.5, -59.25) projected
  line L417 (-116.5, -59.25) -> (-130.5, -59.25) projected
  line L418 (-130.5, -59.25) -> (-130.5, -45.25) projected
  line L419 (-130.5, -45.25) -> (-116.5, -45.25) projected
  line L420 (-140.25, -35.75) -> (-140.25, -49.75) projected
  line L421 (-140.25, -49.75) -> (-154.25, -49.75) projected
  line L422 (-154.25, -49.75) -> (-154.25, -35.75) projected
  line L423 (-154.25, -35.75) -> (-140.25, -35.75) projected
  line L424 (-140.25, 2.25) -> (-140.25, -11.75) projected
  line L425 (-140.25, -11.75) -> (-154.25, -11.75) projected
  line L426 (-154.25, -11.75) -> (-154.25, 2.25) projected
  line L427 (-154.25, 2.25) -> (-140.25, 2.25) projected
  line L428 (-140.25, 30.75) -> (-140.25, 16.75) projected
  line L429 (-140.25, 16.75) -> (-154.25, 16.75) projected
  line L430 (-154.25, 16.75) -> (-154.25, 30.75) projected
  line L431 (-154.25, 30.75) -> (-140.25, 30.75) projected
  line L432 (-173.25, -45.25) -> (-159.25, -45.25) projected
  line L433 (-159.25, -45.25) -> (-159.25, -59.25) projected
  line L434 (-159.25, -59.25) -> (-173.25, -59.25) projected
  line L435 (-173.25, -59.25) -> (-173.25, -45.25) projected
  line L436 (-192.25, -45.25) -> (-178.25, -45.25) projected
  line L437 (-178.25, -45.25) -> (-178.25, -59.25) projected
  line L438 (-178.25, -59.25) -> (-192.25, -59.25) projected
  line L439 (-192.25, -59.25) -> (-192.25, -45.25) projected
  line L440 (-211.25, -45.25) -> (-197.25, -45.25) projected
  line L441 (-197.25, -45.25) -> (-197.25, -59.25) projected
  line L442 (-197.25, -59.25) -> (-211.25, -59.25) projected
  line L443 (-211.25, -59.25) -> (-211.25, -45.25) projected
  line L444 (-173.25, -26.25) -> (-159.25, -26.25) projected
  line L445 (-159.25, -26.25) -> (-159.25, -40.25) projected
  line L446 (-159.25, -40.25) -> (-173.25, -40.25) projected
  line L447 (-173.25, -40.25) -> (-173.25, -26.25) projected
  line L448 (-192.25, -26.25) -> (-178.25, -26.25) projected
  line L449 (-178.25, -26.25) -> (-178.25, -40.25) projected
  line L450 (-178.25, -40.25) -> (-192.25, -40.25) projected
  line L451 (-192.25, -40.25) -> (-192.25, -26.25) projected
  line L452 (-211.25, -26.25) -> (-197.25, -26.25) projected
  line L453 (-197.25, -26.25) -> (-197.25, -40.25) projected
  line L454 (-197.25, -40.25) -> (-211.25, -40.25) projected
  line L455 (-211.25, -40.25) -> (-211.25, -26.25) projected
  line L456 (-173.25, -7.25) -> (-159.25, -7.25) projected
  line L457 (-159.25, -7.25) -> (-159.25, -21.25) projected
  line L458 (-159.25, -21.25) -> (-173.25, -21.25) projected
  line L459 (-173.25, -21.25) -> (-173.25, -7.25) projected
  line L460 (-192.25, -7.25) -> (-178.25, -7.25) projected
  line L461 (-178.25, -7.25) -> (-178.25, -21.25) projected
  line L462 (-178.25, -21.25) -> (-192.25, -21.25) projected
  line L463 (-192.25, -21.25) -> (-192.25, -7.25) projected
  line L464 (-211.25, -7.25) -> (-197.25, -7.25) projected
  line L465 (-197.25, -7.25) -> (-197.25, -21.25) projected
  line L466 (-197.25, -21.25) -> (-211.25, -21.25) projected
  line L467 (-211.25, -21.25) -> (-211.25, -7.25) projected
  line L468 (-173.25, 11.75) -> (-159.25, 11.75) projected
  line L469 (-159.25, 11.75) -> (-159.25, -2.25) projected
  line L470 (-159.25, -2.25) -> (-173.25, -2.25) projected
  line L471 (-173.25, -2.25) -> (-173.25, 11.75) projected
  line L472 (-192.25, 11.75) -> (-178.25, 11.75) projected
  line L473 (-178.25, 11.75) -> (-178.25, -2.25) projected
  line L474 (-178.25, -2.25) -> (-192.25, -2.25) projected
  line L475 (-192.25, -2.25) -> (-192.25, 11.75) projected
  line L476 (-211.25, 11.75) -> (-197.25, 11.75) projected
  line L477 (-197.25, 11.75) -> (-197.25, -2.25) projected
  line L478 (-197.25, -2.25) -> (-211.25, -2.25) projected
  line L479 (-211.25, -2.25) -> (-211.25, 11.75) projected
  line L480 (-173.25, 30.75) -> (-159.25, 30.75) projected
  line L481 (-159.25, 30.75) -> (-159.25, 16.75) projected
  line L482 (-159.25, 16.75) -> (-173.25, 16.75) projected
  line L483 (-173.25, 16.75) -> (-173.25, 30.75) projected
  line L484 (-192.25, 30.75) -> (-178.25, 30.75) projected
  line L485 (-178.25, 30.75) -> (-178.25, 16.75) projected
  line L486 (-178.25, 16.75) -> (-192.25, 16.75) projected
  line L487 (-192.25, 16.75) -> (-192.25, 30.75) projected
  line L488 (-197.25, 30.75) -> (-197.25, 16.75) projected
  line L489 (-197.25, 16.75) -> (-211.25, 16.75) projected
  line L490 (-211.25, 16.75) -> (-211.25, 30.75) projected
  line L491 (-211.25, 30.75) -> (-197.25, 30.75) projected
  line L492 (211.25, 59.25) -> (211.25, 45.25) projected
  line L493 (211.25, 45.25) -> (197.25, 45.25) projected
  line L494 (197.25, 45.25) -> (197.25, 59.25) projected
  line L495 (197.25, 59.25) -> (211.25, 59.25) projected
  line L496 (192.25, 59.25) -> (192.25, 45.25) projected
  line L497 (192.25, 45.25) -> (178.25, 45.25) projected
  line L498 (178.25, 45.25) -> (178.25, 59.25) projected
  line L499 (178.25, 59.25) -> (192.25, 59.25) projected
  line L500 (173.25, 59.25) -> (173.25, 45.25) projected
  line L501 (173.25, 45.25) -> (159.25, 45.25) projected
  line L502 (159.25, 45.25) -> (159.25, 59.25) projected
  line L503 (159.25, 59.25) -> (173.25, 59.25) projected
  line L504 (154.25, 59.25) -> (154.25, 45.25) projected
  line L505 (154.25, 45.25) -> (140.25, 45.25) projected
  line L506 (140.25, 45.25) -> (140.25, 59.25) projected
  line L507 (140.25, 59.25) -> (154.25, 59.25) projected
  line L508 (125.75, 59.25) -> (125.75, 45.25) projected
  line L509 (125.75, 45.25) -> (111.75, 45.25) projected
  line L510 (111.75, 45.25) -> (111.75, 59.25) projected
  line L511 (111.75, 59.25) -> (125.75, 59.25) projected
  line L512 (106.75, 59.25) -> (106.75, 45.25) projected
  line L513 (106.75, 45.25) -> (92.75, 45.25) projected
  line L514 (92.75, 45.25) -> (92.75, 59.25) projected
  line L515 (92.75, 59.25) -> (106.75, 59.25) projected
  line L516 (87.75, 59.25) -> (87.75, 45.25) projected
  line L517 (87.75, 45.25) -> (73.75, 45.25) projected
  line L518 (73.75, 45.25) -> (73.75, 59.25) projected
  line L519 (73.75, 59.25) -> (87.75, 59.25) projected
  line L520 (68.75, 59.25) -> (68.75, 45.25) projected
  line L521 (68.75, 45.25) -> (54.75, 45.25) projected
  line L522 (54.75, 45.25) -> (54.75, 59.25) projected
  line L523 (54.75, 59.25) -> (68.75, 59.25) projected
  line L524 (40.25, 59.25) -> (40.25, 45.25) projected
  line L525 (40.25, 45.25) -> (26.25, 45.25) projected
  line L526 (26.25, 45.25) -> (26.25, 59.25) projected
  line L527 (26.25, 59.25) -> (40.25, 59.25) projected
  line L528 (21.25, 59.25) -> (21.25, 45.25) projected
  line L529 (21.25, 45.25) -> (7.25, 45.25) projected
  line L530 (7.25, 45.25) -> (7.25, 59.25) projected
  line L531 (7.25, 59.25) -> (21.25, 59.25) projected
  line L532 (2.25, 59.25) -> (2.25, 45.25) projected
  line L533 (2.25, 45.25) -> (-11.75, 45.25) projected
  line L534 (-11.75, 45.25) -> (-11.75, 59.25) projected
  line L535 (-11.75, 59.25) -> (2.25, 59.25) projected
  line L536 (-16.75, 59.25) -> (-16.75, 45.25) projected
  line L537 (-16.75, 45.25) -> (-30.75, 45.25) projected
  line L538 (-30.75, 45.25) -> (-30.75, 59.25) projected
  line L539 (-30.75, 59.25) -> (-16.75, 59.25) projected
  line L540 (-54.75, 59.25) -> (-54.75, 45.25) projected
  line L541 (-54.75, 45.25) -> (-68.75, 45.25) projected
  line L542 (-68.75, 45.25) -> (-68.75, 59.25) projected
  line L543 (-68.75, 59.25) -> (-54.75, 59.25) projected
  line L544 (216.125, 61.75) -> (-216.125, 61.75) projected
  arc A0 (-216.125, 61.75) -> (-220.875, 57) centre (-216.125, 57) ccw projected
  line L545 (-220.875, 57) -> (-220.875, -57) projected
  arc A1 (-220.875, -57) -> (-216.125, -61.75) centre (-216.125, -57) ccw projected
  line L546 (-216.125, -61.75) -> (216.125, -61.75) projected
  arc A2 (216.125, -61.75) -> (220.875, -57) centre (216.125, -57) ccw projected
  line L547 (220.875, -57) -> (220.875, 57) projected
  arc A3 (220.875, 57) -> (216.125, 61.75) centre (216.125, 57) ccw projected
  line L548 (223.875, 57) -> (223.875, -57)
  arc A4 (216.125, -64.75) -> (223.875, -57) centre (216.125, -57) ccw
  line L549 (216.125, -64.75) -> (-216.125, -64.75)
  arc A5 (-223.875, -57) -> (-216.125, -64.75) centre (-216.125, -57) ccw
  line L550 (-223.875, -57) -> (-223.875, 57)
  arc A6 (-216.125, 64.75) -> (-223.875, 57) centre (-216.125, 57) ccw
  line L551 (-216.125, 64.75) -> (216.125, 64.75)
  arc A7 (223.875, 57) -> (216.125, 64.75) centre (216.125, 57) ccw
  circle A8 centre (109.25, 13.49) radius 2.35 projected
  circle A9 centre (-175.75, 14.25) radius 2.35 projected
  circle A10 centre (216.125, -57) radius 2.35 projected
  circle A11 centre (133, 57) radius 2.35 projected
  circle A12 centre (216.125, 0) radius 2.35 projected
  circle A13 centre (118.75, -57) radius 2.35 projected
  circle A14 centre (47.5, 57) radius 2.35 projected
  circle A15 centre (-73.625, 57) radius 2.35 projected
  circle A16 centre (23.75, -57) radius 2.35 projected
  circle A17 centre (-66.5, -19) radius 2.35 projected
  circle A18 centre (-216.125, -57) radius 2.35 projected
  circle A19 centre (-216.125, 57) radius 2.35 projected
  circle A20 centre (-216.125, 0) radius 2.35 projected
  circle A21 centre (-133.753, -57) radius 2.35 projected
  circle A22 centre (-47.5, -57) radius 2.35 projected
  circle A23 centre (-45.125, 11.875) radius 2.35 projected
  circle A24 centre (33.25, 13.49) radius 2.35 projected
  circle A25 centre (76, -23.086) radius 2.35 projected
  circle A26 centre (166.25, -40.375) radius 2.35 projected
  circle A27 centre (187.625, 11.875) radius 2.35 projected
  circle A28 centre (216.125, 57) radius 2.35 projected
  circle A29 centre (-114, 14.25) radius 2.35 projected
  circle A30 centre (-175.75, -23.75) radius 2.35 projected
  circle A31 centre (-9.5, -24.356) radius 2.35 projected
  point P0 (9.3413, 36.1541)
  dimension "d4" = 3
extrude "Extrusion3" add sketch "Sketch3" against normal up to surface contours L548 A4 L549 A5 L550 A6 L551 A7 surface through (-45.4451, 14.3376, -5.5632) normal (0, 0.1062, 0.9943)
sketch "Sketch7" plane through (-225.4663, 25.5959, -6.7657) normal (0, -1, 0) x (1, 0, 0)
  line L0 (180.5952, 5.7542) -> (180.5952, 1.7766) projected
  arc A0 (180.5952, 5.7542) -> (180.0212, 6.3283) centre (180.0212, 5.7542) ccw projected
  arc A1 (180.0212, 6.3283) -> (180.5952, 6.9023) centre (180.0212, 6.9023) ccw projected
  line L1 (180.5952, 13.8314) -> (180.5952, 6.9023) projected
  line L2 (180.2625, 13.8314) -> (180.5952, 13.8314) projected
  line L3 (180.2625, 13.8314) -> (180.2625, 14.2073) projected
  line L4 (179.5005, 14.2073) -> (180.2625, 14.2073) projected
  line L5 (179.5005, 13.8314) -> (179.5005, 14.2073) projected
  line L6 (167.6895, 13.8314) -> (179.5005, 13.8314) projected
  line L7 (167.6895, 13.8314) -> (167.6895, 14.2073) projected
  line L8 (166.9275, 14.2073) -> (167.6895, 14.2073) projected
  line L9 (166.9275, 13.8314) -> (166.9275, 14.2073) projected
  line L10 (166.5948, 13.8314) -> (166.9275, 13.8314) projected
  line L11 (166.5948, 13.8314) -> (166.5948, 6.9023) projected
  arc A2 (166.5948, 6.9023) -> (167.1688, 6.3283) centre (167.1688, 6.9023) ccw projected
  arc A3 (167.1688, 6.3283) -> (166.5948, 5.7542) centre (167.1688, 5.7542) ccw projected
  line L12 (166.5948, 5.7542) -> (166.5948, 1.7766) projected
  arc A4 (166.5948, 1.7766) -> (167.1688, 1.2025) centre (167.1688, 1.7766) ccw projected
  line L13 (167.1688, 1.2025) -> (180.0212, 1.2025) projected
  arc A5 (180.0212, 1.2025) -> (180.5952, 1.7766) centre (180.0212, 1.7766) ccw projected
  line L14 (166.5948, 6.9023) -> (166.5948, 5.7542)
  line L15 (166.5948, 13.8314) -> (166.5948, 14.2073)
  line L16 (166.9275, 14.2073) -> (166.5948, 14.2073)
  line L17 (167.6895, 14.2073) -> (179.5005, 14.2073)
  line L18 (180.2625, 14.2073) -> (180.5952, 14.2073)
  line L19 (180.5952, 14.2073) -> (180.5952, 13.8314)
  line L20 (180.5952, 6.9023) -> (180.5952, 5.7542)
  line L21 (180.0212, 1.2025) -> (180.5952, 1.2025)
  line L22 (180.5952, 1.7766) -> (180.5952, 1.2025)
  line L23 (166.5948, 1.7766) -> (166.5948, 1.2025)
  line L24 (167.1688, 1.2025) -> (166.5948, 1.2025)
  point P0 (225.4663, 6.7657)
extrude "Extrusion4" cut sketch "Sketch7" against normal blind 22
sketch "Sketch8" plane through (-45.4451, 14.3376, -5.5632) normal (0, 0.1062, 0.9943) x (-1, 0, 0)
  ellipse E0 centre (180.0212, -6.5454) end of major axis (180.0212, -11.3224) minor radius 4.75 (180.0212, -11.3224) -> (184.7712, -6.5454) ccw projected
  line L0 (184.7712, -6.5454) -> (184.7712, 108.1031) projected
  ellipse E1 centre (180.0212, 108.1031) end of major axis (180.0212, 103.3261) minor radius 4.75 (184.7712, 108.1031) -> (180.0212, 112.8801) ccw projected
  line L1 (180.0212, 112.8801) -> (-252.2288, 112.8801) projected
  ellipse E2 centre (-252.2288, 108.1031) end of major axis (-252.2288, 112.8801) minor radius 4.75 (-252.2288, 112.8801) -> (-256.9788, 108.1031) ccw projected
  line L2 (-256.9788, 108.1031) -> (-256.9788, -6.5454) projected
  ellipse E3 centre (-252.2288, -6.5454) end of major axis (-252.2288, -1.7683) minor radius 4.75 (-256.9788, -6.5454) -> (-252.2288, -11.3224) ccw projected
  line L3 (-252.2288, -11.3224) -> (180.0212, -11.3224) projected
  ellipse E4 centre (-252.2288, -6.5454) end of major axis (-252.2288, -14.3394) minor radius 7.75 (-259.9788, -6.5454) -> (-252.2288, -14.3394) ccw projected
  line L4 (-259.9788, -6.5454) -> (-259.9788, 108.1031) projected
  ellipse E5 centre (-252.2288, 108.1031) end of major axis (-252.2288, 100.309) minor radius 7.75 (-252.2288, 115.8972) -> (-259.9788, 108.1031) ccw projected
  line L5 (-252.2288, 115.8972) -> (180.0212, 115.8972) projected
  ellipse E6 centre (180.0212, 108.1031) end of major axis (180.0212, 115.8972) minor radius 7.75 (187.7712, 108.1031) -> (180.0212, 115.8972) ccw projected
  line L6 (187.7712, 108.1031) -> (187.7712, -6.5454) projected
  ellipse E7 centre (180.0212, -6.5454) end of major axis (180.0212, 1.2487) minor radius 7.75 (180.0212, -14.3394) -> (187.7712, -6.5454) ccw projected
  line L7 (180.0212, -14.3394) -> (-252.2288, -14.3394) projected
  point P0 (-45.4451, 14.8473)
extrude "Extrusion5" add sketch "Sketch8" against normal blind 6 contours L3 E3 L2 E2 L1 E1 L0 E0 | L4 E5 L5 E6 L6 E7 L7 E4
properties part number "FullEnclosurePrototype"
